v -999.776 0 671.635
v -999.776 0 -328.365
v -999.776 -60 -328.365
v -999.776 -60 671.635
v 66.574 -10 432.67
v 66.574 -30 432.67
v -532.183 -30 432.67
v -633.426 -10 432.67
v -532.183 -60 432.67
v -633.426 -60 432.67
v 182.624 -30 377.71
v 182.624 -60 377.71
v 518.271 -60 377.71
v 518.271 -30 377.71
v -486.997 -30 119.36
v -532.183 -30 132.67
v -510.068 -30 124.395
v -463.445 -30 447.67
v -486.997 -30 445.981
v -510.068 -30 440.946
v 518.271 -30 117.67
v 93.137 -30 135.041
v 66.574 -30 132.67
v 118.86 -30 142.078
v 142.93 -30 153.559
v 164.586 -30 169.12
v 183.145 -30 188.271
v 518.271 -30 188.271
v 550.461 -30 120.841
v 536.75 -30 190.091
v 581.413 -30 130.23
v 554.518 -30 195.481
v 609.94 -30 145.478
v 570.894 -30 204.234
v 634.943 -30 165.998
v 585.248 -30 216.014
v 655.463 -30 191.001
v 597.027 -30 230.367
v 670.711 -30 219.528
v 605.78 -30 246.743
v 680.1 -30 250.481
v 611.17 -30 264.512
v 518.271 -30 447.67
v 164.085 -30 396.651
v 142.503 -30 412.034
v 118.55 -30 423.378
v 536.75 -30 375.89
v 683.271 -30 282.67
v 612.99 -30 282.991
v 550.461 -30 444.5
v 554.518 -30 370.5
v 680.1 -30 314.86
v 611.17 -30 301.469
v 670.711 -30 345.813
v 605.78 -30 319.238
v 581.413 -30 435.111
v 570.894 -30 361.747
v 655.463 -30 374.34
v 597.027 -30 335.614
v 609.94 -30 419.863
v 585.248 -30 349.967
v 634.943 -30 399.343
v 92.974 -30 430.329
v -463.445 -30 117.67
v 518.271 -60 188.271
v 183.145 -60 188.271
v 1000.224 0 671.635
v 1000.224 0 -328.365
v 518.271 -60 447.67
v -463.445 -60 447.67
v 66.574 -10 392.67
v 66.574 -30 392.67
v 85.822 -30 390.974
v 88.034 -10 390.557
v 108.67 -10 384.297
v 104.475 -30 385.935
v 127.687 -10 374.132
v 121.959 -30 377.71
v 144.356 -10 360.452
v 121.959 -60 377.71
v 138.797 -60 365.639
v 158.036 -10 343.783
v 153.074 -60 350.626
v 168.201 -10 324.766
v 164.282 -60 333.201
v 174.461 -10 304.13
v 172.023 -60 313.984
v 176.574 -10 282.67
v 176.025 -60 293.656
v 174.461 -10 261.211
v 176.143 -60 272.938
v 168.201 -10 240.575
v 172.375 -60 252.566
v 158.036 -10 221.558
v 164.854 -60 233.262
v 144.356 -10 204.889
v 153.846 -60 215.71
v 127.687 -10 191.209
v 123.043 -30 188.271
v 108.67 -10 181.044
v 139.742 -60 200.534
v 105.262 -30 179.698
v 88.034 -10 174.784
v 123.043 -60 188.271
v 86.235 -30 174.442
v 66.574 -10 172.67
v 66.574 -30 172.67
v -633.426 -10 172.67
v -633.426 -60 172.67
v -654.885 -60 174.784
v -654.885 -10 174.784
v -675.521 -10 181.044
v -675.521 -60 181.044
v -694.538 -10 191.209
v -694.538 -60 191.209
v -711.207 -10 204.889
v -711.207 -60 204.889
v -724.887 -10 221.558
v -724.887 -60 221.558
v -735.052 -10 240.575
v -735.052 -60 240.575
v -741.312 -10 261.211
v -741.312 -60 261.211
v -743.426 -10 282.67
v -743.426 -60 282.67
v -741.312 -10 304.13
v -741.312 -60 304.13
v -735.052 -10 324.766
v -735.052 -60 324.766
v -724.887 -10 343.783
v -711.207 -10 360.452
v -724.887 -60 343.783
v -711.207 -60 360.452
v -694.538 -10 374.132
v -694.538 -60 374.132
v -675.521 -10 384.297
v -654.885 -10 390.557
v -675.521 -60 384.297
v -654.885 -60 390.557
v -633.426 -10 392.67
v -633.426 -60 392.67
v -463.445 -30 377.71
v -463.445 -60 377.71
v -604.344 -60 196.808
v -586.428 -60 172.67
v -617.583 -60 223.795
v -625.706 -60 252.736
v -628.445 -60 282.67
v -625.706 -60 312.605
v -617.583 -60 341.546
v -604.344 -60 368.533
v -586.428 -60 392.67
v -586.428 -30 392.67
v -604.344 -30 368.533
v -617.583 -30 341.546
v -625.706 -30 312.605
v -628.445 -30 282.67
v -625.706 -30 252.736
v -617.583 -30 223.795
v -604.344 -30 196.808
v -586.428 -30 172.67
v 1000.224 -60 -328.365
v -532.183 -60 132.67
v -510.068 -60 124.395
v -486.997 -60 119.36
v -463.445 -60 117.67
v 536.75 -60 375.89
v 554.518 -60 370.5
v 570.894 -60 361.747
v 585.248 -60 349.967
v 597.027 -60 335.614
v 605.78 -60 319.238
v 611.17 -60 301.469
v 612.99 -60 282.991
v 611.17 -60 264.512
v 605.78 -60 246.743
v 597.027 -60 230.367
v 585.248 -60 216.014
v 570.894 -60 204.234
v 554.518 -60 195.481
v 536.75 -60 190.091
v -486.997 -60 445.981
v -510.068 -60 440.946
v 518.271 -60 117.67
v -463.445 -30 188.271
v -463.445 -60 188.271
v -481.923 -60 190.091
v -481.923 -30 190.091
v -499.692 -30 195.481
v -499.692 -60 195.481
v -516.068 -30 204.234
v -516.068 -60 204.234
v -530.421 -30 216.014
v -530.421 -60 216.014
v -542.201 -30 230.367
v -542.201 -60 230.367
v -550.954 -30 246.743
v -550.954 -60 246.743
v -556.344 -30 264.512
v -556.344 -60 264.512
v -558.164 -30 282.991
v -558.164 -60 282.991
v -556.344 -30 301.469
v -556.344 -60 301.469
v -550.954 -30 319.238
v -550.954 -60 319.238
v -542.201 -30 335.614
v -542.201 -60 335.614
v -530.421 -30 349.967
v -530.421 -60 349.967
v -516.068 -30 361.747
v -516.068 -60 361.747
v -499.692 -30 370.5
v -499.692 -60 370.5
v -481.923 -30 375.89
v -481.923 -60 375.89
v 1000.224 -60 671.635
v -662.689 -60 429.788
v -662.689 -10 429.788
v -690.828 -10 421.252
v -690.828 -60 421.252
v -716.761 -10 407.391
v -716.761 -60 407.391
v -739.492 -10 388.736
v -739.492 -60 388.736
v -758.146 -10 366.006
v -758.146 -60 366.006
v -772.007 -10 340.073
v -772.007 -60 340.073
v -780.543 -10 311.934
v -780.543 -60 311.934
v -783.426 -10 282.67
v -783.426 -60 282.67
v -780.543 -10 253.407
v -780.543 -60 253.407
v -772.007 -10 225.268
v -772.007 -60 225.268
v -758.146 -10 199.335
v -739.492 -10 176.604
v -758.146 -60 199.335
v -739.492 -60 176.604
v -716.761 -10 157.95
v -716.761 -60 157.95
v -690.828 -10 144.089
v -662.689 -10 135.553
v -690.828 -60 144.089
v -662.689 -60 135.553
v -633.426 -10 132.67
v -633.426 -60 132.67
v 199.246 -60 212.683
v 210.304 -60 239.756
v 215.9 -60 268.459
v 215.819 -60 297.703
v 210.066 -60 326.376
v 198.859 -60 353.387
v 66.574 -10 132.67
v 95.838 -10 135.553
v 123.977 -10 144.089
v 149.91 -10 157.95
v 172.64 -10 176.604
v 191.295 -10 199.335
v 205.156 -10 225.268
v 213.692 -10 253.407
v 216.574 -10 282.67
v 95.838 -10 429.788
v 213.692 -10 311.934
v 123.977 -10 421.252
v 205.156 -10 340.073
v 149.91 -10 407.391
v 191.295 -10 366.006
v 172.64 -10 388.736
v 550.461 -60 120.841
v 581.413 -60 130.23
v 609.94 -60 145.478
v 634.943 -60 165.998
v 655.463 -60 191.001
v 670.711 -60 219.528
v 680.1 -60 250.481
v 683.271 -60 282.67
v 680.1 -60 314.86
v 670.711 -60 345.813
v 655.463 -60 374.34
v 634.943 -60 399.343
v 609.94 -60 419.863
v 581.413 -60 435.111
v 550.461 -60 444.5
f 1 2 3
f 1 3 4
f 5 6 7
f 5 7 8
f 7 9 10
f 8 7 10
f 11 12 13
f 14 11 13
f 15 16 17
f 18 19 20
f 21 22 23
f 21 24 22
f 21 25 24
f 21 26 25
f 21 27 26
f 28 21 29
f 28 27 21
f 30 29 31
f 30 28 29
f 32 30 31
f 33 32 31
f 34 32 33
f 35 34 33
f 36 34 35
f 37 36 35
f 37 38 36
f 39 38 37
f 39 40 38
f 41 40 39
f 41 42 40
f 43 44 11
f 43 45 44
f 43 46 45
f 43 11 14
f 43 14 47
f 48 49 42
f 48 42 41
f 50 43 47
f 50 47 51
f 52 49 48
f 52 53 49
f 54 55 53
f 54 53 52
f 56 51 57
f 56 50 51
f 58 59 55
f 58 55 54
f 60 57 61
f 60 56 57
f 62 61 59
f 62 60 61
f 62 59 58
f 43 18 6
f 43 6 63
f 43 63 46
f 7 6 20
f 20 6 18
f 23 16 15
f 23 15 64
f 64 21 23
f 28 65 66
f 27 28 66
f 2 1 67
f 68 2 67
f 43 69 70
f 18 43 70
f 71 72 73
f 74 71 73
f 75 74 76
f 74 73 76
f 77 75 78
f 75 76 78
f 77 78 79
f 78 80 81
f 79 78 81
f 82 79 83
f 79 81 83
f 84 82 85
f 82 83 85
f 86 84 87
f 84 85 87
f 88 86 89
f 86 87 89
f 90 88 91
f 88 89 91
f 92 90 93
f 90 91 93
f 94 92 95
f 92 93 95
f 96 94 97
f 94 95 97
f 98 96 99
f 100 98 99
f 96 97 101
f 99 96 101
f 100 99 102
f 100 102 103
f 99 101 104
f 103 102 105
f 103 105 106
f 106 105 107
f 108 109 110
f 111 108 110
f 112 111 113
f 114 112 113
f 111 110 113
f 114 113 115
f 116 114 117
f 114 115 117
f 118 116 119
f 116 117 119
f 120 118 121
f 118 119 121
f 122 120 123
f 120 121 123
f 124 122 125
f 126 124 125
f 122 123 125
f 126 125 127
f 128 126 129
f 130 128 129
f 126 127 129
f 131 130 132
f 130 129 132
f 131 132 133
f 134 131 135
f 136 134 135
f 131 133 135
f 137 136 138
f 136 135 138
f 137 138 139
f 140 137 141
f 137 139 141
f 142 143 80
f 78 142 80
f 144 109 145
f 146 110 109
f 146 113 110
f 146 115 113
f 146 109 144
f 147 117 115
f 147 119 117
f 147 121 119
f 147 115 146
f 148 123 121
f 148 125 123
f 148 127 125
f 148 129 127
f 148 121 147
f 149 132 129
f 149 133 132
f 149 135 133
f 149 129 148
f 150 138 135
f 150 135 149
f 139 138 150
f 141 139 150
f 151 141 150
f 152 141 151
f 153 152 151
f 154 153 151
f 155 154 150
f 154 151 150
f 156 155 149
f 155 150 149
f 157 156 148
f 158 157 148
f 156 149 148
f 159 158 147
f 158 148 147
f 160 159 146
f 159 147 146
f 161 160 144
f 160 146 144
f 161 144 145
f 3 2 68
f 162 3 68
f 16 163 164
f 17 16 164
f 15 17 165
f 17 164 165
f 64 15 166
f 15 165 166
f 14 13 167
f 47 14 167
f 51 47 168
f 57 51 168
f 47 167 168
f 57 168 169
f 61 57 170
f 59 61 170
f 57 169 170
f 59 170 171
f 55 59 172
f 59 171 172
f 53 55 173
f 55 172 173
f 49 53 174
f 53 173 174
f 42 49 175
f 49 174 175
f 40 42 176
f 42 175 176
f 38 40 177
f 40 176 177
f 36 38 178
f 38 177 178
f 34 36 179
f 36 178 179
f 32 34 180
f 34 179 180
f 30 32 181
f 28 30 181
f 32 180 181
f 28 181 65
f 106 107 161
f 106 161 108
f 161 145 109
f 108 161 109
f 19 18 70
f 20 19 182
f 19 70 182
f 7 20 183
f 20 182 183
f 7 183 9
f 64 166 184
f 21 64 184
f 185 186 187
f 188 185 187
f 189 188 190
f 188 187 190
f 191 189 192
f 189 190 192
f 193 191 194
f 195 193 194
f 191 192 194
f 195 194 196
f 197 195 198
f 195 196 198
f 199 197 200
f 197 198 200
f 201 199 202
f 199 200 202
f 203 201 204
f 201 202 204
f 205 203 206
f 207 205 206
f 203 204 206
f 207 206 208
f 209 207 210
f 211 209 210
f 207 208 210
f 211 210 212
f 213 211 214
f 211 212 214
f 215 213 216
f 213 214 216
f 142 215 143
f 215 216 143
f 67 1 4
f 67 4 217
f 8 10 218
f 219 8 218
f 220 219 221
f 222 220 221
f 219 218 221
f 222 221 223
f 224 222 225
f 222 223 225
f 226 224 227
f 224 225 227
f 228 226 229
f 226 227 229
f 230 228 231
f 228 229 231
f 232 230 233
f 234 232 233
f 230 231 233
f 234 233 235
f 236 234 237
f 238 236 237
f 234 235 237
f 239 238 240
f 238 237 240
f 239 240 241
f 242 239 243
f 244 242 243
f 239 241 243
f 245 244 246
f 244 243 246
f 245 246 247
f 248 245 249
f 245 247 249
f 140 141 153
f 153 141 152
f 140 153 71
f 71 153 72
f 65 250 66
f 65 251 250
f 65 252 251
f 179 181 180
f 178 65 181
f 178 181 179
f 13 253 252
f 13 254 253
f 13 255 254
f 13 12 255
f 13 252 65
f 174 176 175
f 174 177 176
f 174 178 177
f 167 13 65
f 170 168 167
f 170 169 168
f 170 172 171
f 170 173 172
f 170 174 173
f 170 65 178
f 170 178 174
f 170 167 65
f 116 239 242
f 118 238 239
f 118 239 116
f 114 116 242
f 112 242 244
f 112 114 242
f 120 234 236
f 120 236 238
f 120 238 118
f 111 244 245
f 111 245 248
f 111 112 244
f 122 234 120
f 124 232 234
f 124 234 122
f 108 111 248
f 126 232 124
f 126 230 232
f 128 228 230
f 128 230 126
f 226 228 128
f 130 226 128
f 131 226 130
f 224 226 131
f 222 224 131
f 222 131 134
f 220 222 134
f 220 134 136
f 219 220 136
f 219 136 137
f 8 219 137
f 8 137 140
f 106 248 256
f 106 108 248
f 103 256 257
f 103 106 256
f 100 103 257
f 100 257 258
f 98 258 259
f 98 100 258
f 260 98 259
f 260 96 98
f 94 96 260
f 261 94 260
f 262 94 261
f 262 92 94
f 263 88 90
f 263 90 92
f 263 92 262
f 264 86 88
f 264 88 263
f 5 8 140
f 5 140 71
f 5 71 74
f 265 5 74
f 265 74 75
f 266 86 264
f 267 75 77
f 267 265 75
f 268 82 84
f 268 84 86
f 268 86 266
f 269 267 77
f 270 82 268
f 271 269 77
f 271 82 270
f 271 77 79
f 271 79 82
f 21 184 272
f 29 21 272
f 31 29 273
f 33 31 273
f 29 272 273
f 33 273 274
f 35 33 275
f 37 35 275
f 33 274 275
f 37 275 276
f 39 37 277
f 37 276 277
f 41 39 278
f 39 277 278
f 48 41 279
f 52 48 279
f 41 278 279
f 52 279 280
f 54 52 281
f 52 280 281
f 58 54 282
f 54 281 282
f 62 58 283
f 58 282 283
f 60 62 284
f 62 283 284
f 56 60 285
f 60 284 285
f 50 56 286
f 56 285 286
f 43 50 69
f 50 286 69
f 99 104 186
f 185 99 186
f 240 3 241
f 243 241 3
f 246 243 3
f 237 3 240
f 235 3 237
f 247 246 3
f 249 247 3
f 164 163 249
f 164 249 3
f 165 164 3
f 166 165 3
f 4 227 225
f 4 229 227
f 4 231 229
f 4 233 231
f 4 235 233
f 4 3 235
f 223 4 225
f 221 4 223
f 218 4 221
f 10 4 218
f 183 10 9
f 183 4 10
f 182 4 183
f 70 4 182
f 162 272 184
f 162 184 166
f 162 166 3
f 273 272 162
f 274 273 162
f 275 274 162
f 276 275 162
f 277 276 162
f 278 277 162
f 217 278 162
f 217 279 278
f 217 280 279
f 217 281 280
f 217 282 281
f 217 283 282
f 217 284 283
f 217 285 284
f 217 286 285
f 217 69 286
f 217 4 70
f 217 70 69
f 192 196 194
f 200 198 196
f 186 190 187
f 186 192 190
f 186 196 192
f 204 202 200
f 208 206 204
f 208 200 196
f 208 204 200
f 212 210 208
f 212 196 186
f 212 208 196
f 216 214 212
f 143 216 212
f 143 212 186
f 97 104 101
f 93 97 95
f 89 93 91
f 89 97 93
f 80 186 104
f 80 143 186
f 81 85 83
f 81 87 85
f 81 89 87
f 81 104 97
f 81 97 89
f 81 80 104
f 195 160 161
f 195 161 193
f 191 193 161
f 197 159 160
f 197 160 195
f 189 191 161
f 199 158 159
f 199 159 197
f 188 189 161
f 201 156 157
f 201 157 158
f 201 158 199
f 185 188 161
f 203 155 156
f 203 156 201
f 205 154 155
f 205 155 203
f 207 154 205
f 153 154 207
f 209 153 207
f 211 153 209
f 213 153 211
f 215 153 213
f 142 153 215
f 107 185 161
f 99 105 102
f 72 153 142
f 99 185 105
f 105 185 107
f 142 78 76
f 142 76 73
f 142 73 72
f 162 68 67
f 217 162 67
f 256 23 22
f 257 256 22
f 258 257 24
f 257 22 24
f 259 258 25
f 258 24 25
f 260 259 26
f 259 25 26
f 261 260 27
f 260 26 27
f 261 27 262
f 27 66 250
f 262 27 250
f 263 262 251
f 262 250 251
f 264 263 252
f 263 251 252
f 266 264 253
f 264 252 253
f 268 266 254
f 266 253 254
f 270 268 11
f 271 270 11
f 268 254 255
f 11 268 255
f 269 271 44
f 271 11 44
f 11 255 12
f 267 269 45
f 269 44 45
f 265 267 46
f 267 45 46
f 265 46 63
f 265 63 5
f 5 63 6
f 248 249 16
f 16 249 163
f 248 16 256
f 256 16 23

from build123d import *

# Parameters (mm, degrees)
F0_W     = 2000
F0_H     = 1000
F1_DEPTH = 60
F3_DEPTH = 50
F5_DEPTH = 30


with BuildPart() as f1:
    # F0 (on Front) → F1 (new body)
    with BuildSketch(Plane.XZ):
        with Locations((0.223722, 171.635427)):
            Rectangle(F0_W, F0_H)
    extrude(amount=F1_DEPTH)

    # F2 (on face) → F3 (cut)
    with BuildSketch(Plane.XZ.offset(60)):
        with BuildLine():
            Line((66.574438, 432.670482), (-633.425562, 432.670482))
            ThreePointArc((-633.425562, 432.670482), (-783.425562, 282.670482), (-633.425562, 132.670482))
            Line((-633.425562, 132.670482), (66.574438, 132.670482))
            ThreePointArc((66.574438, 132.670482), (216.574438, 282.670482), (66.574438, 432.670482))
        make_face()
        with BuildLine():
            ThreePointArc((-633.425562, 172.670482), (-743.425562, 282.670482), (-633.425562, 392.670482))
            Line((-633.425562, 392.670482), (66.574438, 392.670482))
            ThreePointArc((66.574438, 392.670482), (176.574438, 282.670482), (66.574438, 172.670482))
            Line((66.574438, 172.670482), (-633.425562, 172.670482))
        make_face(mode=Mode.SUBTRACT)
    extrude(amount=-F3_DEPTH, mode=Mode.SUBTRACT)

    # F4 (on face) → F5 (cut)
    with BuildSketch(Plane.XZ.offset(60)):
        with BuildLine():
            Line((518.270671, 447.670482), (-463.444501, 447.670482))
            ThreePointArc((-463.444501, 447.670482), (-628.444501, 282.670482), (-463.444501, 117.670482))
            Line((-463.444501, 117.670482), (518.270671, 117.670482))
            ThreePointArc((518.270671, 117.670482), (683.270671, 282.670482), (518.270671, 447.670482))
        make_face()
        with BuildLine():
            ThreePointArc((-463.444501, 188.270956), (-558.16412, 282.990575), (-463.444501, 377.710193))
            Line((-463.444501, 377.710193), (518.270671, 377.710193))
            ThreePointArc((518.270671, 377.710193), (612.99029, 282.990575), (518.270671, 188.270956))
            Line((518.270671, 188.270956), (-463.444501, 188.270956))
        make_face(mode=Mode.SUBTRACT)
    extrude(amount=-F5_DEPTH, mode=Mode.SUBTRACT)


solid = f1.part
